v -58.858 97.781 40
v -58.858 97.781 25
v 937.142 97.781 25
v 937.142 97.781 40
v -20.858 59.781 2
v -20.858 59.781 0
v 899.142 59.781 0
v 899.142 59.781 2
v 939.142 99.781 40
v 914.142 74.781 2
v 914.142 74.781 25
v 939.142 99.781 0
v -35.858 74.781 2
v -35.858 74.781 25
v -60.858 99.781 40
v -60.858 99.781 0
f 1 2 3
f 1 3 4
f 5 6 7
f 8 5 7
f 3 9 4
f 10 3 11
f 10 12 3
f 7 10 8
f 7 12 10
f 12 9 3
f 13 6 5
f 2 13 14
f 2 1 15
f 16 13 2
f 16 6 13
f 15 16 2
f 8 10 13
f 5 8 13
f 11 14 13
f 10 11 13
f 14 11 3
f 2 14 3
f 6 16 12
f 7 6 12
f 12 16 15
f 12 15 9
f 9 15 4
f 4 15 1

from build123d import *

# Parameters (mm, degrees)
SKETCH6_W           = 1000
SKETCH6_H           = 40
BOSS_EXTRUDE3_DEPTH = 40
SKETCH7_W           = 15
SKETCH7_H           = 23
CUT_EXTRUDE3_DEPTH  = 1064
CUT_EXTRUDE4_DEPTH  = 1064


with BuildPart() as part:
    # Sketch6 → Boss-Extrude3 (new body)
    with BuildSketch(Plane.XY):
        with Locations((439.141785032, 79.78108724)):
            Rectangle(SKETCH6_W, SKETCH6_H)
    extrude(amount=BOSS_EXTRUDE3_DEPTH)

    # Sketch7 → Cut-Extrude3 (cut)
    with BuildSketch(Plane.ZY.offset(60.858214968)):
        with Locations((32.5, 86.28108724)):
            Rectangle(SKETCH7_W, SKETCH7_H)
        Polygon((25, 74.78108724), (2, 74.78108724), (2, 59.78108724), (40, 59.78108724), (40, 74.78108724), align=None)
    extrude(amount=-CUT_EXTRUDE3_DEPTH, mode=Mode.SUBTRACT)

    # Sketch8 → Cut-Extrude4 (cut)
    with BuildSketch(Plane(origin=(0, 0, 0), x_dir=(-1, 0, 0), z_dir=(0, 0, -1))):
        Polygon((-939.141785032, 99.78108724), (-899.141785032, 59.78108724), (-939.141785032, 59.78108724), align=None)
        Polygon((60.858214968, 59.78108724), (20.858214968, 59.78108724), (60.858214968, 99.78108724), align=None)
    extrude(amount=-CUT_EXTRUDE4_DEPTH, mode=Mode.SUBTRACT)


solid = part.part
